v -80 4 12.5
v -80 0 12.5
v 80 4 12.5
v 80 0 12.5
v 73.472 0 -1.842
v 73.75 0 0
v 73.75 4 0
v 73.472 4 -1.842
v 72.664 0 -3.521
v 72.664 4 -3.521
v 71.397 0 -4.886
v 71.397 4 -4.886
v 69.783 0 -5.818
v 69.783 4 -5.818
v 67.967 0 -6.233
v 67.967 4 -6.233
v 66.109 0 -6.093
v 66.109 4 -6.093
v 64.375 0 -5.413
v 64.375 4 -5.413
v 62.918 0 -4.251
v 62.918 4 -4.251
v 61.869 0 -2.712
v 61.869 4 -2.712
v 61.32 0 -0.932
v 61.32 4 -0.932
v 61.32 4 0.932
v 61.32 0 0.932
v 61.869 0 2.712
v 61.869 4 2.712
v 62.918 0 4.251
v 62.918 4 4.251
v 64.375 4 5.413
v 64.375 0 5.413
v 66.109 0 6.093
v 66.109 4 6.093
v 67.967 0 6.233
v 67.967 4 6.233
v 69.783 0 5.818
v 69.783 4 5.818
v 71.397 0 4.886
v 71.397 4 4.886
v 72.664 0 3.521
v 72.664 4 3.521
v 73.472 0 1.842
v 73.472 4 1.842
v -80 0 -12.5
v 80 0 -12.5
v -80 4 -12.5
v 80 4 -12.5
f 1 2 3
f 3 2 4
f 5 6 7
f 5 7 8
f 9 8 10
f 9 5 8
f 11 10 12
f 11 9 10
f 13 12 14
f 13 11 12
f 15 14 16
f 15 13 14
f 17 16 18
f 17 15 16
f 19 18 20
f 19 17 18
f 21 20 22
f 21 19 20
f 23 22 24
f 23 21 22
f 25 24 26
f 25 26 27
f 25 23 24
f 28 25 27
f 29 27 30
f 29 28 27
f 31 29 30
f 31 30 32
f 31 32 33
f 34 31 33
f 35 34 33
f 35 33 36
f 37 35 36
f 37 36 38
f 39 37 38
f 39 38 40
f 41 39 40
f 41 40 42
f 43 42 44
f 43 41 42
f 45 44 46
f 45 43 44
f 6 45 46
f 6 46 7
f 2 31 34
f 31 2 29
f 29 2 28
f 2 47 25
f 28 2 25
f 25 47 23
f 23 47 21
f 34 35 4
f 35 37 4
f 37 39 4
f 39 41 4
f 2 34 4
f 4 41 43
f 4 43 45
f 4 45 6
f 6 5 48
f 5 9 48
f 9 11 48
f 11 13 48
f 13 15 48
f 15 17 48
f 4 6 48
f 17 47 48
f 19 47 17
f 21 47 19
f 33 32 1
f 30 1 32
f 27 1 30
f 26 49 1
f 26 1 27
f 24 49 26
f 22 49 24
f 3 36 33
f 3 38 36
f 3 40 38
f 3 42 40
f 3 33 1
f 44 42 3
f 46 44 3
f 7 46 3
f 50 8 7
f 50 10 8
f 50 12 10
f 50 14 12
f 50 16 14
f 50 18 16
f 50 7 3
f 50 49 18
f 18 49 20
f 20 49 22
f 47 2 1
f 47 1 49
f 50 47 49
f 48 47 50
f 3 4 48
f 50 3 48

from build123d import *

# Parameters (mm, degrees)
SKETCH1_W           = 160
SKETCH1_H           = 25
SKETCH1_R           = 6.25
BOSS_EXTRUDE1_DEPTH = 4


with BuildPart() as part:
    # Sketch1 → Boss-Extrude1 (new body)
    with BuildSketch(Plane(origin=(0, 0, 0), x_dir=(1, 0, 0), z_dir=(0, 1, 0))):
        Rectangle(SKETCH1_W, SKETCH1_H)
        with Locations((67.5, 0)):
            Circle(SKETCH1_R, mode=Mode.SUBTRACT)
    extrude(amount=BOSS_EXTRUDE1_DEPTH)


solid = part.part
